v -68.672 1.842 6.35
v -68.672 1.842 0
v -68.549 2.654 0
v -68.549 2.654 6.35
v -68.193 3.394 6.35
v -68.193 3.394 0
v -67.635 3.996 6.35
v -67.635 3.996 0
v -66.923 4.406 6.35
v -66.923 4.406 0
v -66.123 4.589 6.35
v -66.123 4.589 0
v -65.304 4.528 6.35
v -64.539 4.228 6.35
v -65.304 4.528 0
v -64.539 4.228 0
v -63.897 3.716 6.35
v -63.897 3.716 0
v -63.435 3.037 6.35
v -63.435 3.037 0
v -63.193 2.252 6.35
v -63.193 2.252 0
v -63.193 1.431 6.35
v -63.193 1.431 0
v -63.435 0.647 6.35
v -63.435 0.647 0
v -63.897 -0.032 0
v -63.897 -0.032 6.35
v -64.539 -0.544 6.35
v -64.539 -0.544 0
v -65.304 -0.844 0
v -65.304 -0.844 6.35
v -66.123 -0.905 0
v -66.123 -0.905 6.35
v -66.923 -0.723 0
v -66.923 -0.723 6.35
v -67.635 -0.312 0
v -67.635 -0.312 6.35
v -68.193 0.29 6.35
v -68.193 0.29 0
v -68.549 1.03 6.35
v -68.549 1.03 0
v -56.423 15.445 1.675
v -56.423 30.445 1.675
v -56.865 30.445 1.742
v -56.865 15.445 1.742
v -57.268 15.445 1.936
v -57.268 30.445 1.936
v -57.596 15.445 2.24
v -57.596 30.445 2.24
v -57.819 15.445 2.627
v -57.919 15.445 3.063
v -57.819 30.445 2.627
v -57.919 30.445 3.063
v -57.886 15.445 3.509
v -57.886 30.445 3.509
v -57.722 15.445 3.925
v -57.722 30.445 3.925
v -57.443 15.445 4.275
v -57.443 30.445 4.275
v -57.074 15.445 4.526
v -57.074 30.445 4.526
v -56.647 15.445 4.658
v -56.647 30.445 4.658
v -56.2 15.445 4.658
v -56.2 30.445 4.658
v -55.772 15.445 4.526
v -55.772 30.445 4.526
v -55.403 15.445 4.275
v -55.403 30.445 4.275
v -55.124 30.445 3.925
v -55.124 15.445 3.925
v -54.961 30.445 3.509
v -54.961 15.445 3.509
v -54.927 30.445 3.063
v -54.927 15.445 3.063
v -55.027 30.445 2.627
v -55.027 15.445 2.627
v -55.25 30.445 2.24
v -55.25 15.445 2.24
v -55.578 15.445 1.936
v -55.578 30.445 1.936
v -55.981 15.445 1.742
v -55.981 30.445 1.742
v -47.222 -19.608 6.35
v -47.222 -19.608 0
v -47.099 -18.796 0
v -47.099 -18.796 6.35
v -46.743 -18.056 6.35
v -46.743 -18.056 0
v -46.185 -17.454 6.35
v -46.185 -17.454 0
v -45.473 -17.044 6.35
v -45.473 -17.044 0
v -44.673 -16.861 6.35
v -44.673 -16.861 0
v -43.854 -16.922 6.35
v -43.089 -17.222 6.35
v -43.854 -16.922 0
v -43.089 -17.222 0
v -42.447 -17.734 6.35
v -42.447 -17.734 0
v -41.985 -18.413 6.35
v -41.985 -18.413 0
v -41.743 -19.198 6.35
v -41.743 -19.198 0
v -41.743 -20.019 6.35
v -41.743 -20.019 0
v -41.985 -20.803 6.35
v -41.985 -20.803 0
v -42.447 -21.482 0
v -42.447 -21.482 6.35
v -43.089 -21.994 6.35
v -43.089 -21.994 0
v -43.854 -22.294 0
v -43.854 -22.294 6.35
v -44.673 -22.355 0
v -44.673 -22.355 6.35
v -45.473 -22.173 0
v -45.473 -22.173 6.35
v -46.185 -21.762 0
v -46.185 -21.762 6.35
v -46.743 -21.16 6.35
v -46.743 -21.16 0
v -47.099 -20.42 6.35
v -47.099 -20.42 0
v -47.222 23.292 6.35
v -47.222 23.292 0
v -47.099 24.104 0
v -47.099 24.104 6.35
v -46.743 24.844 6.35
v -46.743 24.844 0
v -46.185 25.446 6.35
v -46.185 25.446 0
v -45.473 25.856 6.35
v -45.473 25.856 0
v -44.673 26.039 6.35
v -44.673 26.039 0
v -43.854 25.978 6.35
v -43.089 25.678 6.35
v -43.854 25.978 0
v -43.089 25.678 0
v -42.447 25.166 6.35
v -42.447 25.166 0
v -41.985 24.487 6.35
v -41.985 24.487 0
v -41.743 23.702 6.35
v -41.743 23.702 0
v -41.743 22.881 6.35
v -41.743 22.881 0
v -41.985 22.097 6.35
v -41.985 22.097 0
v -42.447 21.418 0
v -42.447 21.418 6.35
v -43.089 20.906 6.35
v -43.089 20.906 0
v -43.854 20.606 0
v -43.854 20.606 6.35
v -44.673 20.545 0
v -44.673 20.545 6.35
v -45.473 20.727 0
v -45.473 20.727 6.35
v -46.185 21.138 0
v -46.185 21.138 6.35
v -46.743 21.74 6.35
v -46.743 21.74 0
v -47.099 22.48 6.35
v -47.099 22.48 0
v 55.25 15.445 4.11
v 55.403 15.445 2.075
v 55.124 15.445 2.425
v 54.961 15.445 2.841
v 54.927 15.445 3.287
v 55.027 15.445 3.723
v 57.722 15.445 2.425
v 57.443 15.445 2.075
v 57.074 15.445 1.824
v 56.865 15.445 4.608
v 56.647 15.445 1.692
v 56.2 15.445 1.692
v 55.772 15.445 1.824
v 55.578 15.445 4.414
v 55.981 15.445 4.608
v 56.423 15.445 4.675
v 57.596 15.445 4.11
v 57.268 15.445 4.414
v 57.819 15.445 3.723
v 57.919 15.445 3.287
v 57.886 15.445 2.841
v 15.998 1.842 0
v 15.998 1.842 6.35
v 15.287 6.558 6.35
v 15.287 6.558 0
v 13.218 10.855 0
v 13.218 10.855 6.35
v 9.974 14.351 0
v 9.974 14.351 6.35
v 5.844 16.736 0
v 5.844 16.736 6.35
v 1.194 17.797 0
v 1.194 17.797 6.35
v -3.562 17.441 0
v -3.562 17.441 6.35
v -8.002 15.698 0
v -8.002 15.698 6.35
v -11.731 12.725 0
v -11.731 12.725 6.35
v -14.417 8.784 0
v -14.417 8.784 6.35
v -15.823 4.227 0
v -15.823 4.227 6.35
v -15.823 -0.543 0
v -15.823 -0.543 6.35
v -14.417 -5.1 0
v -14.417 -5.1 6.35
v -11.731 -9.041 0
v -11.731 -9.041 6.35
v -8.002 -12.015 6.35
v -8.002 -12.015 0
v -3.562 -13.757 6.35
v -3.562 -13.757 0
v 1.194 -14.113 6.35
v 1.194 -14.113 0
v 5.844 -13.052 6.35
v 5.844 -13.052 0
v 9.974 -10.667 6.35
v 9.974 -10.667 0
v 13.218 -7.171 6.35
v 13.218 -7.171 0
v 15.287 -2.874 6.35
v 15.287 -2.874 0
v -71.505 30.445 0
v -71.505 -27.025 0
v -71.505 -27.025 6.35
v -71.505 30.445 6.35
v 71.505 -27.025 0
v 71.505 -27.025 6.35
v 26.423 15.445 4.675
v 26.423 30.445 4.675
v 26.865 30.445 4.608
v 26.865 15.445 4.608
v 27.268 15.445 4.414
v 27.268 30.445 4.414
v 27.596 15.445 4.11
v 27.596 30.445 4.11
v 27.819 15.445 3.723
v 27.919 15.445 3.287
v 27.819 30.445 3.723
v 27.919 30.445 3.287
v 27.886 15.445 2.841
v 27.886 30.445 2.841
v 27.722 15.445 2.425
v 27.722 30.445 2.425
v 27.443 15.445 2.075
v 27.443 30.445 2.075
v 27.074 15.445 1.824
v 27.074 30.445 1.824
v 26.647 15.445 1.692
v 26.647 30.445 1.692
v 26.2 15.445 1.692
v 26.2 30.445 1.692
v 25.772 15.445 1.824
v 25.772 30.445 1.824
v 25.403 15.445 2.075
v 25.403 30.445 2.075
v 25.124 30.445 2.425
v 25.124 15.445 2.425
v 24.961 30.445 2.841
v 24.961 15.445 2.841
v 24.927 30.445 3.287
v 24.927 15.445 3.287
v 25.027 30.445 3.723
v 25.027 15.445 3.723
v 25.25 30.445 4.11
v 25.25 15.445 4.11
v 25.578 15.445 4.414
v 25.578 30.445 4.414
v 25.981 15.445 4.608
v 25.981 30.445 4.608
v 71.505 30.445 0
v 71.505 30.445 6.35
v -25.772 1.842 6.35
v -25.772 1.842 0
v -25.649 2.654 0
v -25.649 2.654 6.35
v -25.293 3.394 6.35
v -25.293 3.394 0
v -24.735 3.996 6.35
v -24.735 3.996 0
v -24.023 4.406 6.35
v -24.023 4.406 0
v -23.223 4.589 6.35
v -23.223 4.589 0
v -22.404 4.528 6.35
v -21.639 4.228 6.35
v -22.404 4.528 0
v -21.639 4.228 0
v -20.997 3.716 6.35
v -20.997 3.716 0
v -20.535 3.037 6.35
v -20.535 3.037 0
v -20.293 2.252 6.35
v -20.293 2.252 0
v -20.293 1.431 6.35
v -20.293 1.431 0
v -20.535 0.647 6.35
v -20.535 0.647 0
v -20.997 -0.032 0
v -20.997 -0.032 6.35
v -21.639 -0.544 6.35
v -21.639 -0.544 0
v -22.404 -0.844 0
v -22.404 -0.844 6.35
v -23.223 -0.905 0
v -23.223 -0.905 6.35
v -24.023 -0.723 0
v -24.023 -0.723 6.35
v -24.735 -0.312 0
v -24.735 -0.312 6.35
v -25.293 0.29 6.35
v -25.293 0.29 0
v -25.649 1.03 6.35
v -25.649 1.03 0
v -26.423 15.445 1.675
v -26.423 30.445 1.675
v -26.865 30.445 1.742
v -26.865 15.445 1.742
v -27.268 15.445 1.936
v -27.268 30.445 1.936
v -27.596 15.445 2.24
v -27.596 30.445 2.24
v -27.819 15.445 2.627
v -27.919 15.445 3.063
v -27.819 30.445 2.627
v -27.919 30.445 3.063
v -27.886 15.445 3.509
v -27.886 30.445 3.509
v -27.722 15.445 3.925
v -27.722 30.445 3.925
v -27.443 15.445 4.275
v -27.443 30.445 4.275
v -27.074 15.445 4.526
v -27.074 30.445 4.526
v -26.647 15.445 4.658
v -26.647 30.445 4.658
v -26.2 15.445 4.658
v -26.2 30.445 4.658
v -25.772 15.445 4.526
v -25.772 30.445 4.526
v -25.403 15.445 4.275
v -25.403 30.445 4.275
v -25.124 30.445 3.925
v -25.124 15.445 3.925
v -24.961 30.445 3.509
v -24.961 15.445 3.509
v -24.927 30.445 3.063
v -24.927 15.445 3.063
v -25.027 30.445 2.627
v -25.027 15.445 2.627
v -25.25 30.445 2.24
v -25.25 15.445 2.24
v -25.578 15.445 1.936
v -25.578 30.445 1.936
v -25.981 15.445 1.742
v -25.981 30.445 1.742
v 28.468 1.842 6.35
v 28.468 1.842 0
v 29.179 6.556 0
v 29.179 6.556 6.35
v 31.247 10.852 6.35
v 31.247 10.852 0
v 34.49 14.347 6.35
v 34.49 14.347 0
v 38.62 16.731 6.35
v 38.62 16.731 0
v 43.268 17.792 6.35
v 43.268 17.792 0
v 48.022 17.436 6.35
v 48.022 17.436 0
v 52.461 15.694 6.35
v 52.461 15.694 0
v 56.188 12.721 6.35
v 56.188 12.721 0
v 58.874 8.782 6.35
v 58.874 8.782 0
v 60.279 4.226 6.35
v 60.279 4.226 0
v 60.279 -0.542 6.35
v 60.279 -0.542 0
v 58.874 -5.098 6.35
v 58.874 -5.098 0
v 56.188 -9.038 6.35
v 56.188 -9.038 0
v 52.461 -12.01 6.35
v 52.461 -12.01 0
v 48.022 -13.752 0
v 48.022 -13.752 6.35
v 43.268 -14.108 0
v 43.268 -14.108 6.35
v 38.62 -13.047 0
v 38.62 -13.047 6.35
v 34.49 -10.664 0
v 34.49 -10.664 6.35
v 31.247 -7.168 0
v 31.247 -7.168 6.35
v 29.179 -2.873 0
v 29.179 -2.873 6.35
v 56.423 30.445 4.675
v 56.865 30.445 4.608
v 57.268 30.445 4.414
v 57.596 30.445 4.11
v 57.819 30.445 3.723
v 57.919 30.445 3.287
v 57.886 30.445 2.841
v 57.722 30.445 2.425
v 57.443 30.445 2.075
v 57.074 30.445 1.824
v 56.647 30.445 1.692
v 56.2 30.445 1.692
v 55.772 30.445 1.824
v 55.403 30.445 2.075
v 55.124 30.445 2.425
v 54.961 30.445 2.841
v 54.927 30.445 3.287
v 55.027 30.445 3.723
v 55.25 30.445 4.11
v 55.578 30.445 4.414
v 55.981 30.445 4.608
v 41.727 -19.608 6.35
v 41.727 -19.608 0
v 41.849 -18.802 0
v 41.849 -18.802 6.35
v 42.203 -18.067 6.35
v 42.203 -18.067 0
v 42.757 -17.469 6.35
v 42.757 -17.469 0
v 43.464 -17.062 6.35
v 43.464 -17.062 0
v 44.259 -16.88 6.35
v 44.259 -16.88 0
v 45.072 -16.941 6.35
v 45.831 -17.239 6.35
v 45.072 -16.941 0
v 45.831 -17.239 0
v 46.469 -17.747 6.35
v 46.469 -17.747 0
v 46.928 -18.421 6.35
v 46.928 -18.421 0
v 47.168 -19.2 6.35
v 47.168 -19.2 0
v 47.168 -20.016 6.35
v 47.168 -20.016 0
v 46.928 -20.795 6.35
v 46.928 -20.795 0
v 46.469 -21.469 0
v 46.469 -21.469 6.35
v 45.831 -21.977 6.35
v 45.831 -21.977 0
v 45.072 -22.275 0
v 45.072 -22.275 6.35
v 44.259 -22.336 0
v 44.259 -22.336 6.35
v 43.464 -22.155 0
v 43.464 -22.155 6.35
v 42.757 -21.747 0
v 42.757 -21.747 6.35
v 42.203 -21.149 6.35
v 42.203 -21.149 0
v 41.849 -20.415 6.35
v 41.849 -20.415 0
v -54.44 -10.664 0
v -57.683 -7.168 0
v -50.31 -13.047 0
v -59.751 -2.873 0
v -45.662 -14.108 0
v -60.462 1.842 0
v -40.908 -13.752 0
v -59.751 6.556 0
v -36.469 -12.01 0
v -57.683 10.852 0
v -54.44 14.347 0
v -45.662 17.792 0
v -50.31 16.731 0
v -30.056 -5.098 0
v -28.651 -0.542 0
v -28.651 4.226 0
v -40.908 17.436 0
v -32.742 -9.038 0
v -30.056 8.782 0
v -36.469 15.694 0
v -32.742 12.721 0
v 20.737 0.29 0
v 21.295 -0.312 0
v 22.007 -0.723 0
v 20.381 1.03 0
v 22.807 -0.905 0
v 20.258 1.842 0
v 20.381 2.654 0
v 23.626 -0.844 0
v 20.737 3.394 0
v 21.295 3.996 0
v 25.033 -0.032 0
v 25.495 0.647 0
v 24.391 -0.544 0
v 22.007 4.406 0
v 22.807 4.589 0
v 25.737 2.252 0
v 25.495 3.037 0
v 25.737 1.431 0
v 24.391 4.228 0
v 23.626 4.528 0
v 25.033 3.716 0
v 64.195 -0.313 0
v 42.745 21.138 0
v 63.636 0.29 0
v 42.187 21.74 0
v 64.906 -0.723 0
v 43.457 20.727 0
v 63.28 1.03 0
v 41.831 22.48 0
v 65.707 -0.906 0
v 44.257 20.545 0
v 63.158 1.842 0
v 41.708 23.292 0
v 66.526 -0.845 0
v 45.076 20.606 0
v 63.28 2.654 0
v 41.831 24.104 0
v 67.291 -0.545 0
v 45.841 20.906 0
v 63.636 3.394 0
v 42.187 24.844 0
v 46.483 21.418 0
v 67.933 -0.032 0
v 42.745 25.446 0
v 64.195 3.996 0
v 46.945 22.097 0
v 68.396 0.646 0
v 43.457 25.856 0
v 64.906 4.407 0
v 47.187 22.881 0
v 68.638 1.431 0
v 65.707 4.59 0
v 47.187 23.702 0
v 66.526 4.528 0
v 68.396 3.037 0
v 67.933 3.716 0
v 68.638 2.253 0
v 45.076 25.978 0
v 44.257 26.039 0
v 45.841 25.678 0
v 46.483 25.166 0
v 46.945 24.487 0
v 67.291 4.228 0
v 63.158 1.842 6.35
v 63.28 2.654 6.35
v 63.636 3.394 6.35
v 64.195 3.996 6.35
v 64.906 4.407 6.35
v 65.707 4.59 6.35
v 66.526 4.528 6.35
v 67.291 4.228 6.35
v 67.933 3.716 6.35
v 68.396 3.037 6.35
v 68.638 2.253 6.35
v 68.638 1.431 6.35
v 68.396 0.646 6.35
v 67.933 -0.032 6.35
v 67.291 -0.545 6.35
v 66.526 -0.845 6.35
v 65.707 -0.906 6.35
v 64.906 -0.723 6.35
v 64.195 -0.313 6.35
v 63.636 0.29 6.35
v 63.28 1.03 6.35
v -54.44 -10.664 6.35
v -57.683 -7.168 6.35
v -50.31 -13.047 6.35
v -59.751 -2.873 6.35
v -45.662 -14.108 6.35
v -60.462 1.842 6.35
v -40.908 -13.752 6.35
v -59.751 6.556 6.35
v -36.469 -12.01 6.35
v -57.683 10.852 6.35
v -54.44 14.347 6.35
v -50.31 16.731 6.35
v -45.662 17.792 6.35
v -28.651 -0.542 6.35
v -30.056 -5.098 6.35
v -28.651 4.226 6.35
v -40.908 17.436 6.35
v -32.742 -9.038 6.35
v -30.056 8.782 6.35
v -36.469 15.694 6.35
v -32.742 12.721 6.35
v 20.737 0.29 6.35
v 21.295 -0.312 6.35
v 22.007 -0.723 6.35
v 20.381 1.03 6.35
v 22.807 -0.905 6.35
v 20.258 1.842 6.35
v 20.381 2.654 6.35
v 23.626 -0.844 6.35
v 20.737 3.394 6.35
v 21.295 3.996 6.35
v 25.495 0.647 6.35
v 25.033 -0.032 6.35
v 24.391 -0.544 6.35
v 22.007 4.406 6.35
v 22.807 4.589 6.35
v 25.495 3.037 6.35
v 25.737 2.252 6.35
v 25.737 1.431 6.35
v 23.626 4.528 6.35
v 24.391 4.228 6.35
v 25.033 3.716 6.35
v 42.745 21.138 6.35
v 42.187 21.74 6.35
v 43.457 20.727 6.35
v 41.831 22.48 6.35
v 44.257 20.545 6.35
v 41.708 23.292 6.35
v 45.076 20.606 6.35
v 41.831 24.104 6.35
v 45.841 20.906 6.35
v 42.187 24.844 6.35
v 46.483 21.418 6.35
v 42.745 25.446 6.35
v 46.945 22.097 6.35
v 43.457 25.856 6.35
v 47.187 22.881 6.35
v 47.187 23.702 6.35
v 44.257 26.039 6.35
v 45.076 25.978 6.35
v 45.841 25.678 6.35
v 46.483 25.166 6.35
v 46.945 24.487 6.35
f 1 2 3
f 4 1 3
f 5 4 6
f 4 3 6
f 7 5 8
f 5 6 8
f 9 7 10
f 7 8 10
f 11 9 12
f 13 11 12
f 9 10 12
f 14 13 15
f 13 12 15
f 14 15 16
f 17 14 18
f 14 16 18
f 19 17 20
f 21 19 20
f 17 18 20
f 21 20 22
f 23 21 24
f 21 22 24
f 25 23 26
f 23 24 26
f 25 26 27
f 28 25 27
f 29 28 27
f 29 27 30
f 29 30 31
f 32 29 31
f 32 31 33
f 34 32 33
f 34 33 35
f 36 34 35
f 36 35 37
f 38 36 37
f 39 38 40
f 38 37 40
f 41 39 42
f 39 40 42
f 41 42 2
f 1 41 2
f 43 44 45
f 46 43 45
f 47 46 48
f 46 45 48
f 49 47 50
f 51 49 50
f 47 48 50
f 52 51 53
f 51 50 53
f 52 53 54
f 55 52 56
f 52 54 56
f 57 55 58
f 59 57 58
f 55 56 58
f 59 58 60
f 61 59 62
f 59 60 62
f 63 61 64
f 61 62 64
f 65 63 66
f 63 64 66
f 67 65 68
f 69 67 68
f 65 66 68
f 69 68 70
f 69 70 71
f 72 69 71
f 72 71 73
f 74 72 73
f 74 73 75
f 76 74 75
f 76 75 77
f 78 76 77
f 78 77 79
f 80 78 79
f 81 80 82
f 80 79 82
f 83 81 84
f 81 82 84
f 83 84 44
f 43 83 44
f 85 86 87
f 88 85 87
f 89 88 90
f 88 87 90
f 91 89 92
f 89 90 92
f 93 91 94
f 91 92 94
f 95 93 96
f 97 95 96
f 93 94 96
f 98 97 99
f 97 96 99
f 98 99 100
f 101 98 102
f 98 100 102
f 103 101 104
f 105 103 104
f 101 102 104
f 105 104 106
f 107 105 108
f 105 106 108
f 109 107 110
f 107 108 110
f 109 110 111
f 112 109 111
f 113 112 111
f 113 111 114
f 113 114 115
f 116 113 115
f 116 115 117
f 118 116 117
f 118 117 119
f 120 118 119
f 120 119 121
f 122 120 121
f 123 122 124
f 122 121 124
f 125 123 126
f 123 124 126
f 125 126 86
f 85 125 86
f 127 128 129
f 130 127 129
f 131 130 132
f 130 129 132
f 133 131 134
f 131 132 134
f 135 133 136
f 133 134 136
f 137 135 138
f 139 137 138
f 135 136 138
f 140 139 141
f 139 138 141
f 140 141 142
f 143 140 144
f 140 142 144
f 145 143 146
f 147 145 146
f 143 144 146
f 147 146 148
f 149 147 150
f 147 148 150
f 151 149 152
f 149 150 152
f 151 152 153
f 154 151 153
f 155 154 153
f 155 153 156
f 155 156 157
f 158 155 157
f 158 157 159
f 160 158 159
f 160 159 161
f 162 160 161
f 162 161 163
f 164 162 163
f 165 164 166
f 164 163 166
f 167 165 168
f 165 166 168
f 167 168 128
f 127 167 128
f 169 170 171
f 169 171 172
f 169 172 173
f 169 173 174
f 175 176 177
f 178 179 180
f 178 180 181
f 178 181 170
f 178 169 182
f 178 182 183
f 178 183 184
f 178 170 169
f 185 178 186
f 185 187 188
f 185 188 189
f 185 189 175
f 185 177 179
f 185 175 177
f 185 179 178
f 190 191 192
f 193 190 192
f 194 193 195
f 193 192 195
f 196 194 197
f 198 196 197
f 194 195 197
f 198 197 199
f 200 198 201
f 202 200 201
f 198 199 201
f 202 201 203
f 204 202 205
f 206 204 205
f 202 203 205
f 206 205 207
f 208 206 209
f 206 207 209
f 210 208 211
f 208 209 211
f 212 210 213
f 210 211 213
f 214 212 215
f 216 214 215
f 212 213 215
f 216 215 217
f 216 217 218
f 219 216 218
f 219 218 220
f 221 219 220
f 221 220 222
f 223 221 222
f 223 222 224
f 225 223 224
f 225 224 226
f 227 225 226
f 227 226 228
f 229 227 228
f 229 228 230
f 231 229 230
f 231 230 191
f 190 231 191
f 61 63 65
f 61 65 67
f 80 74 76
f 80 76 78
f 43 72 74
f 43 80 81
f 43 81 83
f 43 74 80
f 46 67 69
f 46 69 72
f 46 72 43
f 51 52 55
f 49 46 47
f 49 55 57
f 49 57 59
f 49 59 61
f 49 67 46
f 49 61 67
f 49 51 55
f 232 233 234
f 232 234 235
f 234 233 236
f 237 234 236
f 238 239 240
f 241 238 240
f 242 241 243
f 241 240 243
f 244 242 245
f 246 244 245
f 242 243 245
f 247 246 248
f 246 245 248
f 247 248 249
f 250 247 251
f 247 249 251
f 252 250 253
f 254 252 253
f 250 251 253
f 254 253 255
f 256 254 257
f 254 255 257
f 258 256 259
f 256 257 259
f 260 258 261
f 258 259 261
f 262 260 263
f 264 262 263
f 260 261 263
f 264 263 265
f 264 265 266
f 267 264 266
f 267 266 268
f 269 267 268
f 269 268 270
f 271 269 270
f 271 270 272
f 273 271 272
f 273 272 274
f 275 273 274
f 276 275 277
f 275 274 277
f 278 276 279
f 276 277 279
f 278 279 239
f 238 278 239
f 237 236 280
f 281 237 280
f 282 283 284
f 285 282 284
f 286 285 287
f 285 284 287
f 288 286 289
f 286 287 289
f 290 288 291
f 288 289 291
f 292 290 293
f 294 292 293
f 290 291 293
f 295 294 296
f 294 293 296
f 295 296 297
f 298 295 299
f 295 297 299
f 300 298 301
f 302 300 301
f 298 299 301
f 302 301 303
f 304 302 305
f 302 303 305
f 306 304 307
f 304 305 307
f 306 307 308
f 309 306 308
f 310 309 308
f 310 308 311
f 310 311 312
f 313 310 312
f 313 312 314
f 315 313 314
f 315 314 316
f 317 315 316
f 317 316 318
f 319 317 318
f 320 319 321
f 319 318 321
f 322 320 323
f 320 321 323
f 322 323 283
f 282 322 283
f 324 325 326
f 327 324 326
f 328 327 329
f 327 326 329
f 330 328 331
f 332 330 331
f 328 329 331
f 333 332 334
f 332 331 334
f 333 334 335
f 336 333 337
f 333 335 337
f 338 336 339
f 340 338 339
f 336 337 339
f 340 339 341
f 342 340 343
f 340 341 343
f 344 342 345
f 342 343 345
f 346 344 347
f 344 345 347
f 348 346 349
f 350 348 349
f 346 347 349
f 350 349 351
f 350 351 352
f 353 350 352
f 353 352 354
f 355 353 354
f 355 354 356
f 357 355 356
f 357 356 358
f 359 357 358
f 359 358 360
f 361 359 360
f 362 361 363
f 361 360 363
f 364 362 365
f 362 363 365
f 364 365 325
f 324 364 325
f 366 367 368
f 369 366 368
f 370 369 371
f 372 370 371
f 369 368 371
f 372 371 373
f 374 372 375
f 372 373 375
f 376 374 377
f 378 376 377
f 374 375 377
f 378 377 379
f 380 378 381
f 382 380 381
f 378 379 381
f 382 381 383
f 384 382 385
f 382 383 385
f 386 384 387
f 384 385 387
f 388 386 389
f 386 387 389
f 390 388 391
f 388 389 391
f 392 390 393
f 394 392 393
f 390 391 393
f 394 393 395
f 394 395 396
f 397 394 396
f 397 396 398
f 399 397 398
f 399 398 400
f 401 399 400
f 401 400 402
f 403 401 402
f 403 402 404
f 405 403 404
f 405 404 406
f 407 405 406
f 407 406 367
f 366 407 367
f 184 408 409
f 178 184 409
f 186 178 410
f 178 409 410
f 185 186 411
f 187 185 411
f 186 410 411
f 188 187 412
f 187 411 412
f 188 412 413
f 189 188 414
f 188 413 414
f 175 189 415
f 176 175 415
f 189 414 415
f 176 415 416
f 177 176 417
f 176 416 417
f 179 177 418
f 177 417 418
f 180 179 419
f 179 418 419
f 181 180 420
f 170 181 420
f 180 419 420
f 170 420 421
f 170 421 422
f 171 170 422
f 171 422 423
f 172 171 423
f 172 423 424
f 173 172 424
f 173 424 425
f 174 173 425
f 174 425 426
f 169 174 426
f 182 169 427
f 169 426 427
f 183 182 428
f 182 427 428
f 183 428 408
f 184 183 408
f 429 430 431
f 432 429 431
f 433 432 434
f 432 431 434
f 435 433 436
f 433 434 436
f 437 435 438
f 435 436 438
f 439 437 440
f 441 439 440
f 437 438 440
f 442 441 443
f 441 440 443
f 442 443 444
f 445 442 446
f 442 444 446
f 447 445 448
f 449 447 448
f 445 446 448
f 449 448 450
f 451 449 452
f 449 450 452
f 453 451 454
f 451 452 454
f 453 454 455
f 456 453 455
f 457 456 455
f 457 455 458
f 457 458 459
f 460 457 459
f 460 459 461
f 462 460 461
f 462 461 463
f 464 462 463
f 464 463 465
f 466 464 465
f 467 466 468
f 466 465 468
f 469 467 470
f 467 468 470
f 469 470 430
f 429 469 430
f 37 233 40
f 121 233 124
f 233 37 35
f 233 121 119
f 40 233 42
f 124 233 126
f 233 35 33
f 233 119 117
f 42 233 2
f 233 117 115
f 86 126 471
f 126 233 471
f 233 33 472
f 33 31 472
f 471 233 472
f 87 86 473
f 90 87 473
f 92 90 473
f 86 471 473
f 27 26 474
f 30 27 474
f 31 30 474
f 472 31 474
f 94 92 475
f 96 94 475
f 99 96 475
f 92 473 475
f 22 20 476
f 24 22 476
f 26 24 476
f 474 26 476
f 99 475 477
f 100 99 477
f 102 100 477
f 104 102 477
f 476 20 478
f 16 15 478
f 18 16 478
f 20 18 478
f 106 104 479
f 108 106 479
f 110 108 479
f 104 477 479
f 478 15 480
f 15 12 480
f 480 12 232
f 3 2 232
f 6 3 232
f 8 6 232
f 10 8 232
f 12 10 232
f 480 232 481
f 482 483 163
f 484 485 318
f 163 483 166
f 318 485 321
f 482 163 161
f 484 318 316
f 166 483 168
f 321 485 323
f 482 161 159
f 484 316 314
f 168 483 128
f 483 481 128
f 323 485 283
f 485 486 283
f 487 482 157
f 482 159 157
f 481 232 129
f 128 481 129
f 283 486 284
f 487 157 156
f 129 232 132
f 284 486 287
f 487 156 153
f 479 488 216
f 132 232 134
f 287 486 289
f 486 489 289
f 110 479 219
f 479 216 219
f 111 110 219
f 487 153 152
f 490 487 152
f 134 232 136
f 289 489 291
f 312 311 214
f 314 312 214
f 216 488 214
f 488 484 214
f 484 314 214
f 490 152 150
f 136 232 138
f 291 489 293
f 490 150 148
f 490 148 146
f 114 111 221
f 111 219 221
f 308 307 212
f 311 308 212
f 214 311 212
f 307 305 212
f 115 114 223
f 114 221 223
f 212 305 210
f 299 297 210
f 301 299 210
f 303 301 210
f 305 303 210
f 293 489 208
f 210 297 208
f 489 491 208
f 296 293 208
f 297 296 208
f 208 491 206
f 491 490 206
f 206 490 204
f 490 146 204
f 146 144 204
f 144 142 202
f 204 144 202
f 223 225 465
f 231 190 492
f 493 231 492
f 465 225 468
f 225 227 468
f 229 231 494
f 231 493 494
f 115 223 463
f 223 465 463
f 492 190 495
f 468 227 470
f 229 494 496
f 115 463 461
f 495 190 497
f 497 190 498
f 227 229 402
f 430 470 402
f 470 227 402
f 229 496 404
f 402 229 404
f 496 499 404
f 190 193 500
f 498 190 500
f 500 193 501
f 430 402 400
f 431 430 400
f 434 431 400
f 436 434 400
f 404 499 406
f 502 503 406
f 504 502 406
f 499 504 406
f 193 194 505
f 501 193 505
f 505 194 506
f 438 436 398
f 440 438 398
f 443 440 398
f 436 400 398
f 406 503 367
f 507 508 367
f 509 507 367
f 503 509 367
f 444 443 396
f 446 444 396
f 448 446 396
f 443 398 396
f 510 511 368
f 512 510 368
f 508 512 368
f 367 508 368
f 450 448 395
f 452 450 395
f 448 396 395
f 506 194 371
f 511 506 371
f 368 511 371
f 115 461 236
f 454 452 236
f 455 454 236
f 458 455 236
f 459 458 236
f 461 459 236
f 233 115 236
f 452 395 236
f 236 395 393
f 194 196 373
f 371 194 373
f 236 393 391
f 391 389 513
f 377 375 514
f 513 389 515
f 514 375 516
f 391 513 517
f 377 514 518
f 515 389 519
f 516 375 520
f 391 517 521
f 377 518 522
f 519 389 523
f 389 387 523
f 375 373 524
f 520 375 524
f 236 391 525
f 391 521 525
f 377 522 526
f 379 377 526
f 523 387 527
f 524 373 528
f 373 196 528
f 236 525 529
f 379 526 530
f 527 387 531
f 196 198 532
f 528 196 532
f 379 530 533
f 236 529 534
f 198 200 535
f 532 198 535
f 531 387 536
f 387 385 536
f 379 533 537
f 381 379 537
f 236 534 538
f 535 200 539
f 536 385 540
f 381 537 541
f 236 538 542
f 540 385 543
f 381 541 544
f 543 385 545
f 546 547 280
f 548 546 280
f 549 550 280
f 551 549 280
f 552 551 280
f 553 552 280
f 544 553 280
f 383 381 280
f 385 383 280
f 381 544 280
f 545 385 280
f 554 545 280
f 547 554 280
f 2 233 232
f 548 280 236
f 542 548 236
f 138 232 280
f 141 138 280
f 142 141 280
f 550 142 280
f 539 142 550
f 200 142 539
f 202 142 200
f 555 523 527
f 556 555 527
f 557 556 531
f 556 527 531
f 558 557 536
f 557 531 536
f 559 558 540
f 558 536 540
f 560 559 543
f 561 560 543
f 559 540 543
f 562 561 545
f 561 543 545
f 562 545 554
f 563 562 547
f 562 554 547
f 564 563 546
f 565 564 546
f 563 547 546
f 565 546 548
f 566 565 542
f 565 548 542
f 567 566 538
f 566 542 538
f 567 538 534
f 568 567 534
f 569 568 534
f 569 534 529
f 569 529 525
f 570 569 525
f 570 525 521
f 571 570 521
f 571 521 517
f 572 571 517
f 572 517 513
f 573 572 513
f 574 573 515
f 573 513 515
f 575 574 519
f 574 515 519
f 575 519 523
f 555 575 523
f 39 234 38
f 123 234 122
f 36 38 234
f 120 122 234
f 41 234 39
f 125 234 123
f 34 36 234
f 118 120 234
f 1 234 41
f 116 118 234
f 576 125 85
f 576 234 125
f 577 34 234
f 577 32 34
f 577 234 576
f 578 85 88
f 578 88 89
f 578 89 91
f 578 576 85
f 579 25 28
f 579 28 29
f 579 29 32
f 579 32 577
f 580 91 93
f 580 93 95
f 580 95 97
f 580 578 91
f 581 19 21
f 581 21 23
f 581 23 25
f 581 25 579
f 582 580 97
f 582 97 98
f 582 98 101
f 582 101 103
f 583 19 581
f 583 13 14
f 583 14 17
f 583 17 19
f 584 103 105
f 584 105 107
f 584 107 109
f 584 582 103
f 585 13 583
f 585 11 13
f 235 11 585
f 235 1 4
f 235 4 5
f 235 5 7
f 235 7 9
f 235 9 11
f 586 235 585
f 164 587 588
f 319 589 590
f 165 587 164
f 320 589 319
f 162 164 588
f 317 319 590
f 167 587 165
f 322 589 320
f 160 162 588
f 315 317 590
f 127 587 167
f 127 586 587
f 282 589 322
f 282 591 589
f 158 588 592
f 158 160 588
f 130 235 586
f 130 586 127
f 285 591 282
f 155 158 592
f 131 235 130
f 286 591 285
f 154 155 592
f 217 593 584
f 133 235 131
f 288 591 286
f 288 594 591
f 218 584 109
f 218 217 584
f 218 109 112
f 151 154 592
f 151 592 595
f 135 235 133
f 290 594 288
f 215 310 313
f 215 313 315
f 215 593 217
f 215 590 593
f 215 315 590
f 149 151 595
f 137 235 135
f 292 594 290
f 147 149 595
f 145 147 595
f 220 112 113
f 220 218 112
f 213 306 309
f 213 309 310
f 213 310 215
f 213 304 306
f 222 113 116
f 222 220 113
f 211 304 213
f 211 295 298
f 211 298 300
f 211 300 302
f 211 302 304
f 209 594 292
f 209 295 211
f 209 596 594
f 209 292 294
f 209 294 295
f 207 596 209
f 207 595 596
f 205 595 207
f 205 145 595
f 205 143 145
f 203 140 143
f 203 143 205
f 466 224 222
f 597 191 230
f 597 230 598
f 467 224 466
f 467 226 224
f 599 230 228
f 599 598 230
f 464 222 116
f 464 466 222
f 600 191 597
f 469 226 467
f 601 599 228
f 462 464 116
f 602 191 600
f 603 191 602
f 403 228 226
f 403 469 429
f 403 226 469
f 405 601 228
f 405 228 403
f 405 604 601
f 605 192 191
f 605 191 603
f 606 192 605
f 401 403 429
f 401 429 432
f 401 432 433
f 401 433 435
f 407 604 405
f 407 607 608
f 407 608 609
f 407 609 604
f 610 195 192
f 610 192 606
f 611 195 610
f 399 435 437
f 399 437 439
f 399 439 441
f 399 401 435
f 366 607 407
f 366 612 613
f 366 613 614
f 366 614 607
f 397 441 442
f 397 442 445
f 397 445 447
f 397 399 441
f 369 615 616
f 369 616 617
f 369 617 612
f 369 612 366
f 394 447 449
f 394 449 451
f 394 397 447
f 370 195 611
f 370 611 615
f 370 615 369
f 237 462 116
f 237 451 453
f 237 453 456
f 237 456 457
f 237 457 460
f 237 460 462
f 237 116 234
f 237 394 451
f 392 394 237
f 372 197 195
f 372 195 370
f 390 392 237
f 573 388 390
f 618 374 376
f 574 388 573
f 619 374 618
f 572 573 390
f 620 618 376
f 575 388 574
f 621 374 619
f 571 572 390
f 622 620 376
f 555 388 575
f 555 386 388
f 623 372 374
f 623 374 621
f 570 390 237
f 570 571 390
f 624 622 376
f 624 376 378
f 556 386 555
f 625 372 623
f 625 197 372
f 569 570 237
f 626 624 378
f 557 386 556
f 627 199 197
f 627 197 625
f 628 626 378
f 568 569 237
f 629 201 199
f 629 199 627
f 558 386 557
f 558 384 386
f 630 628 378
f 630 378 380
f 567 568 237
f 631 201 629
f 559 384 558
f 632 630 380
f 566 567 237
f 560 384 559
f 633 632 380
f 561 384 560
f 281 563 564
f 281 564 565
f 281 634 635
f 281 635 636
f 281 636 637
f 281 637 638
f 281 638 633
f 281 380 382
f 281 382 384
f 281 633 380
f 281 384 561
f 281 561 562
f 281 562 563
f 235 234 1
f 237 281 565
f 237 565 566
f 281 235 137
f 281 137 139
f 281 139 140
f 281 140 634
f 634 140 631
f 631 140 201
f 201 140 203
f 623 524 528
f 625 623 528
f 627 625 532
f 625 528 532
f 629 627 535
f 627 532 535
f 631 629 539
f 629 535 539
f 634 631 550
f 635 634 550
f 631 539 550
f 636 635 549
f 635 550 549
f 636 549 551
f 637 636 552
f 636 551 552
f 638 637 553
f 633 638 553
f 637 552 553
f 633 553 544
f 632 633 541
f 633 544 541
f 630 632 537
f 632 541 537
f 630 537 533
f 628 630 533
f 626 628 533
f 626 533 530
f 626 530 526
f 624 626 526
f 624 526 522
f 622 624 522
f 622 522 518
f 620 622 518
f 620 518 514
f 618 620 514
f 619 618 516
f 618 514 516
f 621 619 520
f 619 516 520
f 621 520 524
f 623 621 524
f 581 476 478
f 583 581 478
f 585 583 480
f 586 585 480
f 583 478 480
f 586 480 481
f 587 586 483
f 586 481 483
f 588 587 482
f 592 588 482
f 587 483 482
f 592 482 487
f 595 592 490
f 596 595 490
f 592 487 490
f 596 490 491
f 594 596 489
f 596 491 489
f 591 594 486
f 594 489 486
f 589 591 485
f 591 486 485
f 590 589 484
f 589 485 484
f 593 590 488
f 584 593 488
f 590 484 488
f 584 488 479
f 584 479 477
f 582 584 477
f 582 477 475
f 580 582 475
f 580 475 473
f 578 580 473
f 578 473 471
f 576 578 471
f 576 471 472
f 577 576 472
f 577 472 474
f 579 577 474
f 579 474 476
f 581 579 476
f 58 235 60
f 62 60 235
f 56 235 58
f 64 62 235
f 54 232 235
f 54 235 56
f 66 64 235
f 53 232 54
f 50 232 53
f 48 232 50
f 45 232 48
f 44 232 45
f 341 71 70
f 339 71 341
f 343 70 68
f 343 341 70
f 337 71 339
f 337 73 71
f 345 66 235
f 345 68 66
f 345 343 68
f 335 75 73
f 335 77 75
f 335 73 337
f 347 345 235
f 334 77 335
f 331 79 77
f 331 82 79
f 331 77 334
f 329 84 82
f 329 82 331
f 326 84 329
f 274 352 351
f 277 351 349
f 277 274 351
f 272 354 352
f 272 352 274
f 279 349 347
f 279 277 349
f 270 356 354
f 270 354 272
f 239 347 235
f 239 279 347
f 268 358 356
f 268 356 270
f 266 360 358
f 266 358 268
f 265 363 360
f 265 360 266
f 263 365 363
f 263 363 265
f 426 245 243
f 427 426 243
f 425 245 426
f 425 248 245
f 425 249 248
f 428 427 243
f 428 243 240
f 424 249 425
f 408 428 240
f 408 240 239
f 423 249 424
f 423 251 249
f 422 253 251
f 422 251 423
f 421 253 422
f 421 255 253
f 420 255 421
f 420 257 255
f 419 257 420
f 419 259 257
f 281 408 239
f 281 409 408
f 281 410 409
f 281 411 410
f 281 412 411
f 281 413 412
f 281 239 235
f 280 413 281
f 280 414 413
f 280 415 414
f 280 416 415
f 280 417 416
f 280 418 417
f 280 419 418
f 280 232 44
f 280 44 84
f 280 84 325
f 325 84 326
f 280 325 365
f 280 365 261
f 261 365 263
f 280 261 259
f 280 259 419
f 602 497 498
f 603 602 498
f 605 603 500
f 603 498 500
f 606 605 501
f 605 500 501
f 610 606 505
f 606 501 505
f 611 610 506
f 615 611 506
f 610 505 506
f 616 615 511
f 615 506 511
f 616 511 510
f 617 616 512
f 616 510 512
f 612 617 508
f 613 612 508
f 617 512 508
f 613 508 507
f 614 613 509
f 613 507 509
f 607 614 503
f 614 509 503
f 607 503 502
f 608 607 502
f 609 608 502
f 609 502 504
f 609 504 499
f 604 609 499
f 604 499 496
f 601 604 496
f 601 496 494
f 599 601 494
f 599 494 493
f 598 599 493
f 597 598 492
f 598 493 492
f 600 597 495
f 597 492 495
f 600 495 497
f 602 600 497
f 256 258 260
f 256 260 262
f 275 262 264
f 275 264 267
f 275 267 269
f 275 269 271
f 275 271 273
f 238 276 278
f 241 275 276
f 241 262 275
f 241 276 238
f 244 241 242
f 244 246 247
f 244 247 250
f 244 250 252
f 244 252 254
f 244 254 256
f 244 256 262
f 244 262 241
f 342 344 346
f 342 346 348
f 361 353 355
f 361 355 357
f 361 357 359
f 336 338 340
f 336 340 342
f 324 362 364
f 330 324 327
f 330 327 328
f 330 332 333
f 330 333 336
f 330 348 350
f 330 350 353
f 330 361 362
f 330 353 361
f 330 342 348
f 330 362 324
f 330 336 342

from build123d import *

# Parameters (mm, degrees)
ESBO_O1_W                = 143.01
ESBO_O1_H                = 54.05
RESSALTO_EXTRUS_O1_DEPTH = 6.35
ESBO_O2_R                = 2.755
ESBO_O2_R_2              = 2.755565393
ESBO_O2_R_3              = 2.735691737
CORTE_EXTRUS_O1_DEPTH    = 6.35
ESBO_O3_R                = 15.995
ESBO_O3_R_2              = 10
CORTE_EXTRUS_O2_DEPTH    = 10
ESBO_O4_W                = 143.01
ESBO_O4_H                = 3.42
RESSALTO_EXTRUS_O2_DEPTH = 6.35
ESBO_O5_R                = 16
CORTE_EXTRUS_O3_DEPTH    = 10
ESBO_O6_R                = 1.5
CORTE_EXTRUS_O4_DEPTH    = 15


with BuildPart() as part:
    # Esboço1 → Ressalto-extrusão1 (new body)
    with BuildSketch(Plane.XY):
        Rectangle(ESBO_O1_W, ESBO_O1_H)
    extrude(amount=RESSALTO_EXTRUS_O1_DEPTH)

    # Esboço2 → Corte-extrusão1 (cut)
    with BuildSketch(Plane(origin=(0, 0, 0), x_dir=(-1, 0, 0), z_dir=(0, 0, -1))):
        with Locations((-44.463136928, 23.291850449)):
            Circle(ESBO_O2_R)
        with Locations((-65.913136928, 1.841850449)):
            Circle(ESBO_O2_R_2)
        with Locations((-44.463136928, -19.608149551)):
            Circle(ESBO_O2_R_3)
        with Locations((-23.013136928, 1.841850449)):
            Circle(ESBO_O2_R)
        with Locations((23.016863072, 1.841850449)):
            Circle(ESBO_O2_R)
        with Locations((44.466863072, -19.608149551)):
            Circle(ESBO_O2_R)
        with Locations((65.916863072, 1.841850449)):
            Circle(ESBO_O2_R)
        with Locations((44.466863072, 23.291850449)):
            Circle(ESBO_O2_R)
    extrude(amount=-CORTE_EXTRUS_O1_DEPTH, mode=Mode.SUBTRACT)

    # Esboço3 → Corte-extrusão2 (cut)
    with BuildSketch(Plane(origin=(0, 0, 0), x_dir=(-1, 0, 0), z_dir=(0, 0, -1))):
        with Locations((-44.463136928, 1.841850449)):
            Circle(ESBO_O3_R)
        with Locations((0.001863072, 1.841850449)):
            Circle(ESBO_O3_R_2)
        with Locations((44.466863072, 1.841850449)):
            Circle(ESBO_O3_R)
    extrude(amount=-CORTE_EXTRUS_O2_DEPTH, mode=Mode.SUBTRACT)

    # Esboço4 → Ressalto-extrusão2 (add)
    with BuildSketch(Plane.XY):
        with Locations((0, 28.735)):
            Rectangle(ESBO_O4_W, ESBO_O4_H)
    extrude(amount=RESSALTO_EXTRUS_O2_DEPTH)

    # Esboço5 → Corte-extrusão3 (cut)
    with BuildSketch(Plane.XY.offset(6.35)):
        with Locations((-0.001863072, 1.841850449)):
            Circle(ESBO_O5_R)
    extrude(amount=-CORTE_EXTRUS_O3_DEPTH, mode=Mode.SUBTRACT)

    # Esboço6 → Corte-extrusão4 (cut)
    with BuildSketch(Plane(origin=(0, 30.445, 0), x_dir=(1, 0, 0), z_dir=(0, 1, 0))):
        with Locations(Location((56.423186497, -3.175, 0), (0, 0, 270))):
            Circle(ESBO_O6_R)
        with Locations(Location((26.423186497, -3.175, 0), (0, 0, 270))):
            Circle(ESBO_O6_R)
        with Locations(Location((-26.423186497, -3.175, 0), (0, 0, 90))):
            Circle(ESBO_O6_R)
        with Locations(Location((-56.423186497, -3.175, 0), (0, 0, 90))):
            Circle(ESBO_O6_R)
    extrude(amount=-CORTE_EXTRUS_O4_DEPTH, mode=Mode.SUBTRACT)


solid = part.part
